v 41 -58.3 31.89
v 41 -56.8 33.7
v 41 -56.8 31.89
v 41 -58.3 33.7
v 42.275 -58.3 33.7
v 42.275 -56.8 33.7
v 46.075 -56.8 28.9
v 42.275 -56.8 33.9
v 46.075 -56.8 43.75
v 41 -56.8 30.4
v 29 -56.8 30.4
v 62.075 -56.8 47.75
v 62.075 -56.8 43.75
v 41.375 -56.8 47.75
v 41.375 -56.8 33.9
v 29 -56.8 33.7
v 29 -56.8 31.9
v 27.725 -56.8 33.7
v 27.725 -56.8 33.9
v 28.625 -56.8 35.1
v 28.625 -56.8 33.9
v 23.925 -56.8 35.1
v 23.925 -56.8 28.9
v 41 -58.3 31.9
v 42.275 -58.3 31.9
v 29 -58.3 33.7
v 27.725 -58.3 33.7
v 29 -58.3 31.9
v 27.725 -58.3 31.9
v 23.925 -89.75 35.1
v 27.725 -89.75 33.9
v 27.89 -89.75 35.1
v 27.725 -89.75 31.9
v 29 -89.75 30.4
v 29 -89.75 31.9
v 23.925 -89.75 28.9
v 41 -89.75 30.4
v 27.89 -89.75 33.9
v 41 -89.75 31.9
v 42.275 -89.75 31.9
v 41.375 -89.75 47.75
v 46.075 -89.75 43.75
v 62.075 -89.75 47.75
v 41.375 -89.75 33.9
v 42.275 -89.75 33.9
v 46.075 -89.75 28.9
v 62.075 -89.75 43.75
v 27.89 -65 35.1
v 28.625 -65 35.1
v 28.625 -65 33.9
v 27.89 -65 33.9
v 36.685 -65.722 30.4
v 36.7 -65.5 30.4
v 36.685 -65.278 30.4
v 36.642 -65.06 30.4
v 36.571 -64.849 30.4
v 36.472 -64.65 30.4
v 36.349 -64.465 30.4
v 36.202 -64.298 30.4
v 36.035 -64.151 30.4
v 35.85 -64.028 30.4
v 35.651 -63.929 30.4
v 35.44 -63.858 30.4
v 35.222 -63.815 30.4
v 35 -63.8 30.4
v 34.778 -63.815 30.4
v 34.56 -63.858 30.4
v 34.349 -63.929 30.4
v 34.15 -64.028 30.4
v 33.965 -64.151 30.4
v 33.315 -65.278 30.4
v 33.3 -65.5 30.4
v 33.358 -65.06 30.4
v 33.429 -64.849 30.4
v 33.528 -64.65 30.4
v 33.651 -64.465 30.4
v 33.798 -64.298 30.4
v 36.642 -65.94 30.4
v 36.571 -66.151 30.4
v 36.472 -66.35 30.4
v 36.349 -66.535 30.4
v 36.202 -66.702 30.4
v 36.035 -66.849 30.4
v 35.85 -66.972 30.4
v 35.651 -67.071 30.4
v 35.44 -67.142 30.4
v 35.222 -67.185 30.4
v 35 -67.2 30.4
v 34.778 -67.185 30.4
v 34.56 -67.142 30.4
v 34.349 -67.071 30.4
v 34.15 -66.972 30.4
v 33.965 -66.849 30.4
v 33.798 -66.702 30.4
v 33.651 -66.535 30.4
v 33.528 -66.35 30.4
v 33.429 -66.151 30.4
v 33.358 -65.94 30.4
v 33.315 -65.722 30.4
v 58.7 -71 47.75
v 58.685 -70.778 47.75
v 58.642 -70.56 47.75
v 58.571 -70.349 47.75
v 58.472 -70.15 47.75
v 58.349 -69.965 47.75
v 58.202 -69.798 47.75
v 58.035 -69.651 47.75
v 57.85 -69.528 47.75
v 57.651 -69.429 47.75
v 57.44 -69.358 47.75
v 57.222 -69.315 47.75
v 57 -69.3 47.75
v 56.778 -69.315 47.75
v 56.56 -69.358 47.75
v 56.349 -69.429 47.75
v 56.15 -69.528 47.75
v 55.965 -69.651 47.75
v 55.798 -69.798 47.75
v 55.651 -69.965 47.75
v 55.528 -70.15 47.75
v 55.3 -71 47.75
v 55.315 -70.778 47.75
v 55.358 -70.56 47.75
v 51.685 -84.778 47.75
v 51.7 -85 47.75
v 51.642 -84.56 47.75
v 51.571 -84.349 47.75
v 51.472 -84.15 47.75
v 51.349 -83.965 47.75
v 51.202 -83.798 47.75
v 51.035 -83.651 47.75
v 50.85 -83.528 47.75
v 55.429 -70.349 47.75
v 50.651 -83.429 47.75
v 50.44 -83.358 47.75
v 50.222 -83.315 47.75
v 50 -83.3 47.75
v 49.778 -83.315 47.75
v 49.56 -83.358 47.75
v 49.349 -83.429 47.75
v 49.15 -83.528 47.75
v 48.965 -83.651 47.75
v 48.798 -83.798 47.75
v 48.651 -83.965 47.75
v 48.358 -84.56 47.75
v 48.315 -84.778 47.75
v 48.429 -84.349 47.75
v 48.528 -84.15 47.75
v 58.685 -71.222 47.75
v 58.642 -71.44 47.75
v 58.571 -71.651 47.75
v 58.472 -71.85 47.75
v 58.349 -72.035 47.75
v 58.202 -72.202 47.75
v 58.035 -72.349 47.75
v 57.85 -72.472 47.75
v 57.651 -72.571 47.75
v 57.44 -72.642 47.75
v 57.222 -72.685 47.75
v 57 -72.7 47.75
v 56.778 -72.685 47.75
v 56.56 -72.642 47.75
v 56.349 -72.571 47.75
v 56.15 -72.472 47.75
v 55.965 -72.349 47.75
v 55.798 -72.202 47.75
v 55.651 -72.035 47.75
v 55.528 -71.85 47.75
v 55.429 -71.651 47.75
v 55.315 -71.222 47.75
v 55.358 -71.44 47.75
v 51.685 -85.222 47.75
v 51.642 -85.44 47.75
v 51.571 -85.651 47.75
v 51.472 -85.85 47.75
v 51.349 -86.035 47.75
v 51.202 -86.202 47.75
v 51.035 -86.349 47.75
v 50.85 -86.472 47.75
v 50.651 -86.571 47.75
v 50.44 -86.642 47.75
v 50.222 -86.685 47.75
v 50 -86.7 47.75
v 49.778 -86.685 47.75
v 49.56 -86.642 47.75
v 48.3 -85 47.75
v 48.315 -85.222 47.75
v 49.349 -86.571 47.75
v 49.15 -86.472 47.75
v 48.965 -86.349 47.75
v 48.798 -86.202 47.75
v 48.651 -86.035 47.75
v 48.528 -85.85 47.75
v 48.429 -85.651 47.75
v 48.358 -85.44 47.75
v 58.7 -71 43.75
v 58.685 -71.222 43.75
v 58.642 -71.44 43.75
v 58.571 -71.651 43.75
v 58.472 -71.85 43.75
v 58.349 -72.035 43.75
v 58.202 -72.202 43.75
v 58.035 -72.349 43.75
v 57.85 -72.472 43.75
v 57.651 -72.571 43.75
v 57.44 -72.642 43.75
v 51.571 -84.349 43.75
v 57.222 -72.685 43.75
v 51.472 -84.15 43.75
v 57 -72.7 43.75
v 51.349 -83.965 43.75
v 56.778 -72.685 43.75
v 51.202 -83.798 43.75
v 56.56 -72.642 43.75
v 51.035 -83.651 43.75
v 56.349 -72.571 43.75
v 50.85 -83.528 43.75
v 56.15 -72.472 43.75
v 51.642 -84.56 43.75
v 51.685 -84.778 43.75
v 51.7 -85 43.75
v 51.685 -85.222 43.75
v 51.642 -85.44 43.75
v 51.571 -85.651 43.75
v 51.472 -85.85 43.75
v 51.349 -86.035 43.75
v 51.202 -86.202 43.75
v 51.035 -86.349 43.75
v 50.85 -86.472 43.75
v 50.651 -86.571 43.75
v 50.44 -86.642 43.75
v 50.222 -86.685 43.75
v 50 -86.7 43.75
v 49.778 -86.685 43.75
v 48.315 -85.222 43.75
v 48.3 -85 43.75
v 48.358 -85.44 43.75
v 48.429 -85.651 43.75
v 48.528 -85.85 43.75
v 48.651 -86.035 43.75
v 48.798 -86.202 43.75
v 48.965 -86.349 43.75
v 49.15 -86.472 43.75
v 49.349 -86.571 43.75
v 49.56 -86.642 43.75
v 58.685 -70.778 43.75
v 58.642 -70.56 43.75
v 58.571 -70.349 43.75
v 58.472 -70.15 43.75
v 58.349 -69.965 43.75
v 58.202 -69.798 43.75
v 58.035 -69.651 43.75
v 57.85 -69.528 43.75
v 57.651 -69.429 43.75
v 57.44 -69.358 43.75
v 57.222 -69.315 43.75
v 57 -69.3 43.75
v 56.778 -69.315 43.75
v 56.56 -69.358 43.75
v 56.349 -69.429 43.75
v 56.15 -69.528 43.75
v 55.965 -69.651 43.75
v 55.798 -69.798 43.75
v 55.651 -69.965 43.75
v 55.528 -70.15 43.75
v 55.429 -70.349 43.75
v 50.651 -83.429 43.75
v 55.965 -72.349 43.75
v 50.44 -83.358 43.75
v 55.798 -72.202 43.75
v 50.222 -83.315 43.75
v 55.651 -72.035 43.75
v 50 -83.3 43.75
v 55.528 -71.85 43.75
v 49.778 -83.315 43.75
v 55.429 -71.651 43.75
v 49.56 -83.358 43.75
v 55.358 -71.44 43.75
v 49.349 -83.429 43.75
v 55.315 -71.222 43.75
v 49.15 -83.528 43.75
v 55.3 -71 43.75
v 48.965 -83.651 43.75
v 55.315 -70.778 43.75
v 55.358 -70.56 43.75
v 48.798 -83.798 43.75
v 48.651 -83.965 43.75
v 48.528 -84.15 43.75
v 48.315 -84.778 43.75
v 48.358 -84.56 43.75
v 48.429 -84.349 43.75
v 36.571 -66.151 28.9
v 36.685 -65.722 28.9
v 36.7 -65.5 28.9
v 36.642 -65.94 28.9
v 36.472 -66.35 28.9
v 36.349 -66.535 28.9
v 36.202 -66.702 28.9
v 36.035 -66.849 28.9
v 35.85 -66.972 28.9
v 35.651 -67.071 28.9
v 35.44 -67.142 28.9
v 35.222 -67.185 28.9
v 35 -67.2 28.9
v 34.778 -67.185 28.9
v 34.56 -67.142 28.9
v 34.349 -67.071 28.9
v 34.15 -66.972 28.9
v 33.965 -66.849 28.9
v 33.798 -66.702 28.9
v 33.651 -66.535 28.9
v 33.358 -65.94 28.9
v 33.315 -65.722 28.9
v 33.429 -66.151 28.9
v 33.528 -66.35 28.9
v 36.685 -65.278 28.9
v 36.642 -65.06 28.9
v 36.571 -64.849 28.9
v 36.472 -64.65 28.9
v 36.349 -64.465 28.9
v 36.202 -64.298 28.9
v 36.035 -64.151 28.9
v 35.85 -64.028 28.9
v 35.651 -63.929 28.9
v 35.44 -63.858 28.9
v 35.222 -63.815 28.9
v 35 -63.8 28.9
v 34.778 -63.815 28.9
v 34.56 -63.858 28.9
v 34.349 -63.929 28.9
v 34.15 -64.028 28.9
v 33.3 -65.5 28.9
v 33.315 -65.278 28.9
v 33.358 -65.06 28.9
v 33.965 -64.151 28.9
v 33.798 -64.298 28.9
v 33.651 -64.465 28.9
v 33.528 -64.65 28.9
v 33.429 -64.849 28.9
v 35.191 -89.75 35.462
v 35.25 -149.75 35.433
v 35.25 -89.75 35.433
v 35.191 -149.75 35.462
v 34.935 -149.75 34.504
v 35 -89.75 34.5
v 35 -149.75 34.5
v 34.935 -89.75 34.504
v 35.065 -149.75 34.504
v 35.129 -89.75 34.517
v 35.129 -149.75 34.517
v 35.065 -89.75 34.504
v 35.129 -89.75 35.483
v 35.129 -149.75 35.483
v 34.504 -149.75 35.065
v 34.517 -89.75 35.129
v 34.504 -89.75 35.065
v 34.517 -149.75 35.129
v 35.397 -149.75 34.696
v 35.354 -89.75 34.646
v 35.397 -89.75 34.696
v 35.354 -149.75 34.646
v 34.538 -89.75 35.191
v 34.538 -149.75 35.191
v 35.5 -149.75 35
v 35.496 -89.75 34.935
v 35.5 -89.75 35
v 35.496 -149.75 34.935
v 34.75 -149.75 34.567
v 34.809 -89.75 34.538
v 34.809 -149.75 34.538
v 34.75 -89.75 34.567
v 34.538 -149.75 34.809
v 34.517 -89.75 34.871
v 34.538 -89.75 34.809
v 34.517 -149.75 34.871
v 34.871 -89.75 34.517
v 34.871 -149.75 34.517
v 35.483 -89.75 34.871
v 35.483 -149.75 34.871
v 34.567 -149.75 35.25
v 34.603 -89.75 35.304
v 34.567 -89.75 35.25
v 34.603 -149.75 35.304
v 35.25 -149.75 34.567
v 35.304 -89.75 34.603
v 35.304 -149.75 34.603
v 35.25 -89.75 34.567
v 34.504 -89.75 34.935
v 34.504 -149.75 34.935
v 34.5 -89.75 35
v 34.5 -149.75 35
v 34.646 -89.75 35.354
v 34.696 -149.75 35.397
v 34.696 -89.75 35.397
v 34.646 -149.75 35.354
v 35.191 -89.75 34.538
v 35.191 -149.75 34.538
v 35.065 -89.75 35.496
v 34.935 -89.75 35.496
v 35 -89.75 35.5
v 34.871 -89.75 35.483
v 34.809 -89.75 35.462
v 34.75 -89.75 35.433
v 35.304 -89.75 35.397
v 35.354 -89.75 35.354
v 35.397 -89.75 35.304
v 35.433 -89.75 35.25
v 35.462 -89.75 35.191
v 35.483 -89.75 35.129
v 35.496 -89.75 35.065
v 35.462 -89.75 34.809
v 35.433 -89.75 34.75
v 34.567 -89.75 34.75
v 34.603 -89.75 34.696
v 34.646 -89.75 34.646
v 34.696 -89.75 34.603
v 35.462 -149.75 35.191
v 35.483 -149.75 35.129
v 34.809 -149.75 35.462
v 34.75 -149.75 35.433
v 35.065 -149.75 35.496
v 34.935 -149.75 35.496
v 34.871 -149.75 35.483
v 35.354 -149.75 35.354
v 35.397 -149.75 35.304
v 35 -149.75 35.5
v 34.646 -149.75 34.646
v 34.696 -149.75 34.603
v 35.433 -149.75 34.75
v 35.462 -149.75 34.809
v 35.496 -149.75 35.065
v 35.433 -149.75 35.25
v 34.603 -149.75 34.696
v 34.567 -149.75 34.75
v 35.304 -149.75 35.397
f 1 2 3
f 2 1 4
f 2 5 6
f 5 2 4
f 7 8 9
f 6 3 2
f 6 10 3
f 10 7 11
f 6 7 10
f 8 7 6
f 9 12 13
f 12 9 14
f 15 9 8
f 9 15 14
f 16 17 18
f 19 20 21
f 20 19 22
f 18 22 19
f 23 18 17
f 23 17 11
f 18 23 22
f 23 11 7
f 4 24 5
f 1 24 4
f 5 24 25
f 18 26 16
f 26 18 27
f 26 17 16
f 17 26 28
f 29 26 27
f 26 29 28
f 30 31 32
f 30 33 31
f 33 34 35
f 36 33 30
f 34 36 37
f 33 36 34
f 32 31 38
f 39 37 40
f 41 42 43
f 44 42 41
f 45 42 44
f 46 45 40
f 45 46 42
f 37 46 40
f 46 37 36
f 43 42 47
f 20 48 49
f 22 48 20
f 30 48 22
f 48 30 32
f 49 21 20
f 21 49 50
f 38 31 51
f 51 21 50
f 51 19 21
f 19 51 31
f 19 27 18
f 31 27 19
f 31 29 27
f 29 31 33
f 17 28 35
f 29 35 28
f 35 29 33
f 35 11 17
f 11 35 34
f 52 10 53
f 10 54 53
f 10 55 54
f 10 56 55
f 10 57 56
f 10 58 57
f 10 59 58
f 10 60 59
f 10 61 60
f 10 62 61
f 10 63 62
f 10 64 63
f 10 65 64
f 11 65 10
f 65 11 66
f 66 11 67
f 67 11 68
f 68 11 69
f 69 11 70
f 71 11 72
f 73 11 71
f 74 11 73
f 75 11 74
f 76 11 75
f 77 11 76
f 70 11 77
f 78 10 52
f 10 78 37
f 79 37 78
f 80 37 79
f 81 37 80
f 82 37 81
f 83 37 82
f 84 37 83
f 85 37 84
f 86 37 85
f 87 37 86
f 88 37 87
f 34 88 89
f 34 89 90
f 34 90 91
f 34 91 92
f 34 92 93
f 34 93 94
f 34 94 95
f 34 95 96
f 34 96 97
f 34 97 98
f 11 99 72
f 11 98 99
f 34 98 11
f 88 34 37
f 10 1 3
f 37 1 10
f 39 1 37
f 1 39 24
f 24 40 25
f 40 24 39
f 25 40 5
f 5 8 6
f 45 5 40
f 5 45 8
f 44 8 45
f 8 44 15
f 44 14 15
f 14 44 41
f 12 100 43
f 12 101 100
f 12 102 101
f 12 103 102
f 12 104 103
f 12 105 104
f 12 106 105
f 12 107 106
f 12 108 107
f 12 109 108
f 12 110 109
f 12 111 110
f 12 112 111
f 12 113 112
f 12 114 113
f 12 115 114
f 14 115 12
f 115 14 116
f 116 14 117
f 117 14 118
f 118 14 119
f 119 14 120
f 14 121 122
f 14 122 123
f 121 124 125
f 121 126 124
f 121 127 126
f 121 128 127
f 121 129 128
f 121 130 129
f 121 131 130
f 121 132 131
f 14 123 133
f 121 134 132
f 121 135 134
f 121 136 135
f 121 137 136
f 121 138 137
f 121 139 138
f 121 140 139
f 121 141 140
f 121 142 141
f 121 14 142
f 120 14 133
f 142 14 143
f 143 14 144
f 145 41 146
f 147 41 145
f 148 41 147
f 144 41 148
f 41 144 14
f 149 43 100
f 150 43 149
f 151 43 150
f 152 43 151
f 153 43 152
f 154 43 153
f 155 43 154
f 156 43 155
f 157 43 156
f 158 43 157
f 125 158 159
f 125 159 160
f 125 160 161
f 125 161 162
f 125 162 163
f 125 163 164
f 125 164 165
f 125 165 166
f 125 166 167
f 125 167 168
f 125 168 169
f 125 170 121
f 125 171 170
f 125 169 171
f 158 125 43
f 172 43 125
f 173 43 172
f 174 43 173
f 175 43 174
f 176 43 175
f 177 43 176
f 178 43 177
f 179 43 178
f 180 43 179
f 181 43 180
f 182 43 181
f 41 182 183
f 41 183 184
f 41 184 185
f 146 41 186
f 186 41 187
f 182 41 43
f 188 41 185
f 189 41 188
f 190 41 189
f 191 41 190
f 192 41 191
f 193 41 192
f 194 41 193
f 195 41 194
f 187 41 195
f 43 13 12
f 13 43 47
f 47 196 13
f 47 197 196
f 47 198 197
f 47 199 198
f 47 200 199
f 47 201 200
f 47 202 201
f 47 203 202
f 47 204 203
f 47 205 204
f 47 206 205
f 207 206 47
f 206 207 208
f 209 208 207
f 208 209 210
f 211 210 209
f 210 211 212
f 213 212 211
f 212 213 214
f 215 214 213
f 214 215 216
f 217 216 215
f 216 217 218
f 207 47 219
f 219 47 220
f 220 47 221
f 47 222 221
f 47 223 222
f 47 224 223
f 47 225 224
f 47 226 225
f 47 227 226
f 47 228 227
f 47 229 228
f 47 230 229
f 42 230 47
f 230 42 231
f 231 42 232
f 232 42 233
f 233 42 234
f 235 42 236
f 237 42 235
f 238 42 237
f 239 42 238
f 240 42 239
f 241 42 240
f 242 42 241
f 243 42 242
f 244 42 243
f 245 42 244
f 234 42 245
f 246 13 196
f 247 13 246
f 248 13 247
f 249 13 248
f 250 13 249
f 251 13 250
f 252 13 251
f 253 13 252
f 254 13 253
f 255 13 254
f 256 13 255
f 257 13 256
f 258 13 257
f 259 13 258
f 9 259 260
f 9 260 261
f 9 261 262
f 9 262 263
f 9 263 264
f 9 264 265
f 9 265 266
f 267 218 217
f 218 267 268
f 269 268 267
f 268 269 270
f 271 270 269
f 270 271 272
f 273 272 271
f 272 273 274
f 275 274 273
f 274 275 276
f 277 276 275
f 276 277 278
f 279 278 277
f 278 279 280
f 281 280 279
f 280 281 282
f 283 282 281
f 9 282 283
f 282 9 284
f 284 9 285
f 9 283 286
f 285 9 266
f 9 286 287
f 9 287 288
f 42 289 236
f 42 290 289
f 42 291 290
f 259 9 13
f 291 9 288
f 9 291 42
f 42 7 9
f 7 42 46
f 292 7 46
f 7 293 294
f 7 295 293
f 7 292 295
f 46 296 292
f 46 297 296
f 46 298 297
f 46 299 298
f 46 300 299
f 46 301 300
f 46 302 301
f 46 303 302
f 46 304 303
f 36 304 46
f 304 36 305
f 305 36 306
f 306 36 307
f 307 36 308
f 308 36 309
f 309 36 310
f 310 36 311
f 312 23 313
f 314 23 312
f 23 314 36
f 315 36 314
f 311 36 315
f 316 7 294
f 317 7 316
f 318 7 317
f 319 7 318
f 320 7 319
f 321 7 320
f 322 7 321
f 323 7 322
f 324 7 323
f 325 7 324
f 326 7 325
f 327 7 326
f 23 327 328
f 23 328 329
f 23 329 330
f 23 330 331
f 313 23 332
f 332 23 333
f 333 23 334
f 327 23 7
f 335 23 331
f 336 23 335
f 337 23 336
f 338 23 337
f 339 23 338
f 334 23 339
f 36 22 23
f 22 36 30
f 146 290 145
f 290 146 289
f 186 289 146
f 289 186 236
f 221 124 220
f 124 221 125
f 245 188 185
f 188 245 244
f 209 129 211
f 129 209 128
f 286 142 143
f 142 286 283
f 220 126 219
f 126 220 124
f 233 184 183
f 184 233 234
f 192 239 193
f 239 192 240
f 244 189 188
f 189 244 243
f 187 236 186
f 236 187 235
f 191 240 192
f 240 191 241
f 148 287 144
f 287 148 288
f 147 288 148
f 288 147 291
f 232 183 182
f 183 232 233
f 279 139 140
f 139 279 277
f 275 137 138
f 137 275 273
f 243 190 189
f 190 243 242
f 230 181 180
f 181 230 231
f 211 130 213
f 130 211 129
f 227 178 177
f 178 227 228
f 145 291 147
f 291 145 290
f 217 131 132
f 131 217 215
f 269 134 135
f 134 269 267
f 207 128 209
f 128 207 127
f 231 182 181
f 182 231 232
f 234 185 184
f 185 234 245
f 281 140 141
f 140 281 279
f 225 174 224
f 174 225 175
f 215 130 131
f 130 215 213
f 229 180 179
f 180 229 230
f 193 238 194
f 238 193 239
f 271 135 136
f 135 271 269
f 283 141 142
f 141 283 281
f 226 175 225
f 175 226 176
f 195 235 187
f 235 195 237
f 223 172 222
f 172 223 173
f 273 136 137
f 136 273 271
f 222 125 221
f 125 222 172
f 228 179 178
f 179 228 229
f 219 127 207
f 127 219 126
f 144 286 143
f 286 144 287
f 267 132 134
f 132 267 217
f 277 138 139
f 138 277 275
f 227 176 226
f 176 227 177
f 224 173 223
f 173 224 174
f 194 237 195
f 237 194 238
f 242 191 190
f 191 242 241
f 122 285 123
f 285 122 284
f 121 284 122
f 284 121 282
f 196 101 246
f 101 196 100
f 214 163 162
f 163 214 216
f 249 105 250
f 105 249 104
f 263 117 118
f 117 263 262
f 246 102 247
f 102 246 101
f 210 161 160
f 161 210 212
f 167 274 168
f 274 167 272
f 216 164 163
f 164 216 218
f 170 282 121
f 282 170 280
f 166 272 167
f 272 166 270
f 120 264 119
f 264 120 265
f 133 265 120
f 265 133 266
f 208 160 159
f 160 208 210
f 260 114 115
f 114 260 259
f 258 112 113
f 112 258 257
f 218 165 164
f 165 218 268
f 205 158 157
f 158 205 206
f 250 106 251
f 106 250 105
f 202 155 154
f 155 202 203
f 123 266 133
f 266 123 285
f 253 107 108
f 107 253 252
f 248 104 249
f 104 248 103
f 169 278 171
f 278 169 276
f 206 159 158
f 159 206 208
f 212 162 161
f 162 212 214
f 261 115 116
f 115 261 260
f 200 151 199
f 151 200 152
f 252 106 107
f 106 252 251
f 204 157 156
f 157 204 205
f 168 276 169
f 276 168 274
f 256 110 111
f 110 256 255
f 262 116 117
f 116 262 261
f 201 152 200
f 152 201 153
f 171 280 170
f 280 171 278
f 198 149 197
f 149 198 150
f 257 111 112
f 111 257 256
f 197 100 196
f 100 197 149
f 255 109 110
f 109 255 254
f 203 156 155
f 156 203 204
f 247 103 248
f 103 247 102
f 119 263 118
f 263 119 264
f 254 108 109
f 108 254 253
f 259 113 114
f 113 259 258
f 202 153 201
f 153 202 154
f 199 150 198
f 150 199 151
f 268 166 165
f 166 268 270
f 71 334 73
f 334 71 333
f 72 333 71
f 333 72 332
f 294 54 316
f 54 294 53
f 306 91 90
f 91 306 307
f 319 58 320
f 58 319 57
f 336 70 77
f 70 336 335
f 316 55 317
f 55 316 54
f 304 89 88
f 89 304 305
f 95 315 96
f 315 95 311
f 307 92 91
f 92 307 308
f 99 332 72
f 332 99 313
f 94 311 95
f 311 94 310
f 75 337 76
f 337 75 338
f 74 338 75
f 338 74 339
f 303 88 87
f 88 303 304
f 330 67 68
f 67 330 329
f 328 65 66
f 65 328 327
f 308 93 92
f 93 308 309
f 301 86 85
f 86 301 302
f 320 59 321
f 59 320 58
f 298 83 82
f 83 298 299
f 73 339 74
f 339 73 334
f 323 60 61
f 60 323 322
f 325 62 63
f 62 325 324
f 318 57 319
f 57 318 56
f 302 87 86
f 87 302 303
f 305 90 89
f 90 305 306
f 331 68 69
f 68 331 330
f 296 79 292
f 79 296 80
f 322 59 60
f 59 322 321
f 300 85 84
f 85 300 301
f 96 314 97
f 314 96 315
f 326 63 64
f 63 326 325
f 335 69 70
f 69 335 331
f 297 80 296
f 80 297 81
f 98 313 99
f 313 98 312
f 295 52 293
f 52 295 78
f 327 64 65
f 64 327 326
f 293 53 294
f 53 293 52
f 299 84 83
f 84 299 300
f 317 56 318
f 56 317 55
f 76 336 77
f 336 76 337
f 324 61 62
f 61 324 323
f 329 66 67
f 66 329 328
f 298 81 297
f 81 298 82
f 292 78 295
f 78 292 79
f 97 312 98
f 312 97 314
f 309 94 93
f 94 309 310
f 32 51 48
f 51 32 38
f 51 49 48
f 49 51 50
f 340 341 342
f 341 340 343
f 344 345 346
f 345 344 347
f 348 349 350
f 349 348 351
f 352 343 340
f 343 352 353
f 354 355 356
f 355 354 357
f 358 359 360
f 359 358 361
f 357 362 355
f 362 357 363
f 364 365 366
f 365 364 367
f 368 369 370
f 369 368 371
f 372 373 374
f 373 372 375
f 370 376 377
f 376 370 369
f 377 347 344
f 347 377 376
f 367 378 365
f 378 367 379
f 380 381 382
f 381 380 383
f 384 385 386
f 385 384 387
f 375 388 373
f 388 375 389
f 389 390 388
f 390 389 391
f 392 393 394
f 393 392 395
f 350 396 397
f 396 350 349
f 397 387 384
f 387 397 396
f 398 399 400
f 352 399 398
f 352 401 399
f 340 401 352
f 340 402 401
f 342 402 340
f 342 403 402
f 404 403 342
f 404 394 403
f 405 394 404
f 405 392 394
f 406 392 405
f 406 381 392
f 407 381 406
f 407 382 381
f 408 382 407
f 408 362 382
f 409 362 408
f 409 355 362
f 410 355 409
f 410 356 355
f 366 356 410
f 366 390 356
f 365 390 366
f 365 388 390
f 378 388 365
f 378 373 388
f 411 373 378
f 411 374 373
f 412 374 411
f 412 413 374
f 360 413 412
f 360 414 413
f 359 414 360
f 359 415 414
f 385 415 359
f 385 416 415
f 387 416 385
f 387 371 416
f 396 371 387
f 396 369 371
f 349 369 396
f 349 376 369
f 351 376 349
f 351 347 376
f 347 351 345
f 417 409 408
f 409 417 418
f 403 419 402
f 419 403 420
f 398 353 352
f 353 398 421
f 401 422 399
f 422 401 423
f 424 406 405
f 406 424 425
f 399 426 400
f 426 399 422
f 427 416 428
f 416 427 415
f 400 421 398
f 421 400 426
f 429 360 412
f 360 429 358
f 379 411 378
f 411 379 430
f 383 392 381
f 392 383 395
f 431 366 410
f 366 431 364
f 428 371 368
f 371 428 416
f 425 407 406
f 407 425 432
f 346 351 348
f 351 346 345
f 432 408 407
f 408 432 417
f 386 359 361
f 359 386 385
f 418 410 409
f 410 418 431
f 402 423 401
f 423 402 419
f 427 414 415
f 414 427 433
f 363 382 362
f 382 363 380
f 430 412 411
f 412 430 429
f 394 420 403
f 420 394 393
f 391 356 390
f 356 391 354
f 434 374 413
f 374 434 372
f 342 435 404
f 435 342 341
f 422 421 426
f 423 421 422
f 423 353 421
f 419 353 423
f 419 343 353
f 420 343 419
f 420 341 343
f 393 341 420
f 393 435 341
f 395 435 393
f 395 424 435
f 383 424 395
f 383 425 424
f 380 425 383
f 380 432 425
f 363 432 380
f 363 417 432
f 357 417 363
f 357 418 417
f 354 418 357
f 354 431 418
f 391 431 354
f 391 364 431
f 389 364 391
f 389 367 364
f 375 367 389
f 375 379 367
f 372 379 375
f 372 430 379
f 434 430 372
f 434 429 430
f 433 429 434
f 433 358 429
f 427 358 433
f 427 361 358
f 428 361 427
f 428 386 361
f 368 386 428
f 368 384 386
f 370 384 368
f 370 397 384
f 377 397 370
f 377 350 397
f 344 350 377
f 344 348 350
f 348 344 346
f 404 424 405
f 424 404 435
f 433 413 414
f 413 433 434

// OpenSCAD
// BLOC-BOT: rear mount for the MH-Sensor-Series "Flying Fish" IR obstacle module.
// Rear Flying Fish sensor mount. Units: mm.
//
// Robot frame: x right, y forward, z up, floor at z = 0. Plate rear edge at y = -89.75
// (the plate's own edge; only the hex pillar tabs reach out to y = -104).
// The board lies flat, long side along y, IR LED end pointing backwards (-y).
// The whole part is one profile in the XZ plane extruded along y, so it prints on its
// side with no supports.
//
//   export = true  -> print-oriented solid only (for the STL)
//   export = false -> mount in place on the robot, with ghost plate, caster and board

export = false;

// ---- robot (from the BLOC-BOT repo README and the "waffle plate" Fusion design)
plate_under_z = 47.75;   // plate underside above the floor
plate_rear_y  = -89.75;  // rear edge of the plate body, measured in Fusion. The README's
                         // 210 x 210 is the outline including the hex pillar tabs.
caster_y      = -80;     // rear caster, centred on x = 0
// Plate holes the flange bolts through (robot x, y), measured in Fusion: 4.5 mm through
// holes on the right-rear side of the plate. M3 screws, head on top of the plate.
plate_holes = [[50, -85], [57, -71]];

// ---- board (from the GrabCAD model "Sensor, IR, Arduino Type, Flying Fish MH-B",
//      BLOC-BOT/CAD/sensor-ir-arduino-type-flying-fish-mh-b-1.snapshot.3.zip)
pcb_l = 31.25;           // LED end to header end
pcb_w = 14.15;
pcb_t = 1.6;
led_axis_above = 1.3;    // LED centre above the PCB top
led_gap = 1.5;           // LED flange starts this far past the PCB edge
led_protrude = 10.2;     // LED tips past the PCB edge
led_pitch = 8;           // LED centres are +-4 from the board centre line
pin_below = 1.0;         // LED leads and header pins poke this far through the PCB bottom
pin_span = 11.2;         // width of the band those pin tips sit in (+-5.6 from centre)
hole_y = 24.25;          // board hole centre from the LED end (7 from the header end)
hole_d = 3.4;            // board hole is 3.0; 3.4 here = M3 clearance (prints lying sideways,
                         // so it comes out a little small)

// ---- placement
sensor_h = 35;           // LED centre line above the floor
x_offset = 35;           // board centre to the side of the caster (+x = right)
led_overhang = 0;        // PCB LED edge past the plate rear edge (+ = further out)

// ---- part
wall = 4;                // drop wall / near rail width
rail = 4;                // far rail width
shelf_t = 3;             // shelf under the board
channel_w = 12;          // relief channel in the shelf for the pin tips
channel_d = 1.5;         // its depth (pin tips stick out 1.0)
stop_l = 1.5;            // end stop at the header end; the board slides in from the LED end
lip = 0.7;               // how far the rails overlap the board edges. 1.0 left a 0.97 mm tall
                         // chip on the board only 0.14 mm from the lip (checked on the model)
lip_t = 1.2;             // lip thickness above the board
clr = 0.2;               // clearance each side of the board in the grooves
flange_t = 4;
flange_w = 16;           // flange reach sideways, away from the board; ends at robot
                         // x = 62, before the plate's rounded corner cut-out starts (x = 63)
screw_d = 3.4;           // M3 clearance holes, on the plate holes above
$fn = 48;

// ---- derived (local frame: plate underside z = 0, board x 0..pcb_w, LED end y = 0)
drop   = plate_under_z - sensor_h;          // 12.75 with the defaults
pcb_top = -drop - led_axis_above;
pcb_bot = pcb_top - pcb_t;
lip_top = pcb_top + clr + lip_t;
shelf_bot = pcb_bot - clr - shelf_t;
x_near = -wall;                              // outer face of the drop wall
x_far  = pcb_w + rail;
fx0 = x_near - flange_w;                     // flange outer edge
body_l = pcb_l + clr + stop_l;               // length of the part along y

module profile() {
    difference() {
        union() {
            translate([fx0, -flange_t]) square([flange_w + wall + lip, flange_t]);    // flange
            translate([x_near, shelf_bot]) square([wall + lip, -shelf_bot]);         // drop wall
            translate([x_near, shelf_bot]) square([x_far - x_near, shelf_t]);         // shelf
            translate([pcb_w - lip, shelf_bot]) square([rail + lip, lip_top - shelf_bot]); // far rail
        }
        translate([-clr, pcb_bot - clr]) square([pcb_w + 2 * clr, pcb_t + 2 * clr]); // board groove
        translate([lip, pcb_top]) square([pcb_w - 2 * lip, 50]);                      // room above the board
        translate([(pcb_w - channel_w) / 2, pcb_bot - clr - channel_d])
            square([channel_w, channel_d + 0.01]);                                  // pin-tip channel
    }
}

// robot (x, y) -> local (x, y); inverse of place() below
function to_local(p) = [x_offset + pcb_w / 2 - p[0], p[1] - (plate_rear_y - led_overhang)];

module mount_local() {
    difference() {
        union() {
            rotate([90, 0, 0]) mirror([0, 0, 1]) linear_extrude(body_l) profile();  // extrude along +y
            // end stop: fills the groove on both edge strips, clear of the pin-tip channel
            for (x0 = [-clr, (pcb_w + channel_w) / 2])
                translate([x0, pcb_l + clr, pcb_bot - clr - 0.01]) cube([(pcb_w - channel_w) / 2 + clr, stop_l, pcb_t + clr + 0.01]);
        }
        for (p = plate_holes)                           // screw holes on the plate holes
            translate([to_local(p)[0], to_local(p)[1], 0]) cylinder(d = screw_d, h = 50, center = true);
        translate([pcb_w / 2, hole_y, shelf_bot]) cylinder(d = hole_d, h = 10, center = true);
        // the far lip is cut away from the LED end up to past the pot, so the pot can slide in
        translate([pcb_w / 2 - 0.9, -1, pcb_top]) cube([8.01, 24.25 + 0.5 + 1, 10]);
    }
}

module dummy_board() {
    translate([0, 0, pcb_bot]) {
        c = pcb_w / 2;
        color("royalblue") difference() {
            cube([pcb_w, pcb_l, pcb_t]);
            translate([c, hole_y, -1]) cylinder(d = 3, h = 5);
        }
        for (s = [-1, 1]) {                                                // IR LED + receiver
            color(s < 0 ? "white" : "black") translate([c + s * led_pitch / 2, 0, pcb_t + led_axis_above]) rotate([90, 0, 0]) {
                translate([0, 0, led_gap]) cylinder(d = 5.8, h = 1.1);
                translate([0, 0, led_gap]) cylinder(d = 4.9, h = led_protrude - led_gap - 2.45);
                translate([0, 0, led_protrude - 2.45]) sphere(d = 4.9);
            }
            for (o = [2.73, 5.27])                                         // LED leads through the board
                color("silver") translate([c + s * o - 0.3, -led_gap, -pin_below]) cube([0.6, led_gap + 2.87, pin_below + pcb_t + led_axis_above]);
        }
        color("dodgerblue") translate([c - 0.4 + 0.0, 11.92, pcb_t]) cube([7.0, 12.33, 4.91]); // pot
        color("black") translate([c - 3.62, 24.25, pcb_t]) cube([7.25, 6.65, 1.9]);          // header body
        for (i = [-1, 0, 1]) color("gold") {                                                 // right-angle pins
            translate([c + i * 2.54 - 0.33, 29.32, -pin_below]) cube([0.66, 0.66, pin_below + pcb_t + 5.03]);
            translate([c + i * 2.54 - 0.33, 29.32, pcb_t + 4.37]) cube([0.66, 7.14, 0.66]);
        }
    }
}

// local -> robot: board centre at x_offset, flange towards +x (away from the caster),
// LED end at the plate rear edge, plate underside at plate_under_z
module place() {
    translate([x_offset + pcb_w / 2, plate_rear_y - led_overhang, plate_under_z])
        mirror([1, 0, 0]) children();
}

if (export) {
    // stand the extrusion on its header-end face: the profile is flat on the bed.
    // Mirrored like place() does, so the printed part is the one shown on the robot
    // (flange away from the caster), not its mirror image.
    rotate([-90, 0, 0]) translate([0, -body_l, 0]) mirror([1, 0, 0]) mount_local();
} else {
    place() { color("orange") mount_local(); %dummy_board(); }
    %translate([plate_rear_y, plate_rear_y, plate_under_z]) cube([-2 * plate_rear_y, 60, 10]); // plate (rear strip)
    %translate([0, caster_y, 0]) cylinder(r = 15, h = plate_under_z);             // caster envelope
    color("red", 0.4) translate([x_offset, plate_rear_y - 60, sensor_h]) rotate([-90, 0, 0]) cylinder(d = 1, h = 60); // beam axis
}

echo(str("drop below plate = ", drop, " mm; shelf bottom above floor = ", plate_under_z + shelf_bot,
         " mm; nearest part to caster centre x = ", x_offset + pcb_w / 2 - x_far, " mm"));
echo(str("flange robot x ", x_offset + pcb_w / 2 - (x_near + wall + lip), " .. ", x_offset + pcb_w / 2 - fx0,
         ", y ", plate_rear_y - led_overhang, " .. ", plate_rear_y - led_overhang + body_l));
for (p = plate_holes) {
    l = to_local(p);
    assert(l[0] > fx0 + screw_d / 2 + 1.5 && l[0] < x_near - screw_d / 2 - 0.5
           && l[1] > screw_d / 2 + 1.5 && l[1] < body_l - screw_d / 2 - 1.5,
           str("plate hole ", p, " is not on the flange"));
}
